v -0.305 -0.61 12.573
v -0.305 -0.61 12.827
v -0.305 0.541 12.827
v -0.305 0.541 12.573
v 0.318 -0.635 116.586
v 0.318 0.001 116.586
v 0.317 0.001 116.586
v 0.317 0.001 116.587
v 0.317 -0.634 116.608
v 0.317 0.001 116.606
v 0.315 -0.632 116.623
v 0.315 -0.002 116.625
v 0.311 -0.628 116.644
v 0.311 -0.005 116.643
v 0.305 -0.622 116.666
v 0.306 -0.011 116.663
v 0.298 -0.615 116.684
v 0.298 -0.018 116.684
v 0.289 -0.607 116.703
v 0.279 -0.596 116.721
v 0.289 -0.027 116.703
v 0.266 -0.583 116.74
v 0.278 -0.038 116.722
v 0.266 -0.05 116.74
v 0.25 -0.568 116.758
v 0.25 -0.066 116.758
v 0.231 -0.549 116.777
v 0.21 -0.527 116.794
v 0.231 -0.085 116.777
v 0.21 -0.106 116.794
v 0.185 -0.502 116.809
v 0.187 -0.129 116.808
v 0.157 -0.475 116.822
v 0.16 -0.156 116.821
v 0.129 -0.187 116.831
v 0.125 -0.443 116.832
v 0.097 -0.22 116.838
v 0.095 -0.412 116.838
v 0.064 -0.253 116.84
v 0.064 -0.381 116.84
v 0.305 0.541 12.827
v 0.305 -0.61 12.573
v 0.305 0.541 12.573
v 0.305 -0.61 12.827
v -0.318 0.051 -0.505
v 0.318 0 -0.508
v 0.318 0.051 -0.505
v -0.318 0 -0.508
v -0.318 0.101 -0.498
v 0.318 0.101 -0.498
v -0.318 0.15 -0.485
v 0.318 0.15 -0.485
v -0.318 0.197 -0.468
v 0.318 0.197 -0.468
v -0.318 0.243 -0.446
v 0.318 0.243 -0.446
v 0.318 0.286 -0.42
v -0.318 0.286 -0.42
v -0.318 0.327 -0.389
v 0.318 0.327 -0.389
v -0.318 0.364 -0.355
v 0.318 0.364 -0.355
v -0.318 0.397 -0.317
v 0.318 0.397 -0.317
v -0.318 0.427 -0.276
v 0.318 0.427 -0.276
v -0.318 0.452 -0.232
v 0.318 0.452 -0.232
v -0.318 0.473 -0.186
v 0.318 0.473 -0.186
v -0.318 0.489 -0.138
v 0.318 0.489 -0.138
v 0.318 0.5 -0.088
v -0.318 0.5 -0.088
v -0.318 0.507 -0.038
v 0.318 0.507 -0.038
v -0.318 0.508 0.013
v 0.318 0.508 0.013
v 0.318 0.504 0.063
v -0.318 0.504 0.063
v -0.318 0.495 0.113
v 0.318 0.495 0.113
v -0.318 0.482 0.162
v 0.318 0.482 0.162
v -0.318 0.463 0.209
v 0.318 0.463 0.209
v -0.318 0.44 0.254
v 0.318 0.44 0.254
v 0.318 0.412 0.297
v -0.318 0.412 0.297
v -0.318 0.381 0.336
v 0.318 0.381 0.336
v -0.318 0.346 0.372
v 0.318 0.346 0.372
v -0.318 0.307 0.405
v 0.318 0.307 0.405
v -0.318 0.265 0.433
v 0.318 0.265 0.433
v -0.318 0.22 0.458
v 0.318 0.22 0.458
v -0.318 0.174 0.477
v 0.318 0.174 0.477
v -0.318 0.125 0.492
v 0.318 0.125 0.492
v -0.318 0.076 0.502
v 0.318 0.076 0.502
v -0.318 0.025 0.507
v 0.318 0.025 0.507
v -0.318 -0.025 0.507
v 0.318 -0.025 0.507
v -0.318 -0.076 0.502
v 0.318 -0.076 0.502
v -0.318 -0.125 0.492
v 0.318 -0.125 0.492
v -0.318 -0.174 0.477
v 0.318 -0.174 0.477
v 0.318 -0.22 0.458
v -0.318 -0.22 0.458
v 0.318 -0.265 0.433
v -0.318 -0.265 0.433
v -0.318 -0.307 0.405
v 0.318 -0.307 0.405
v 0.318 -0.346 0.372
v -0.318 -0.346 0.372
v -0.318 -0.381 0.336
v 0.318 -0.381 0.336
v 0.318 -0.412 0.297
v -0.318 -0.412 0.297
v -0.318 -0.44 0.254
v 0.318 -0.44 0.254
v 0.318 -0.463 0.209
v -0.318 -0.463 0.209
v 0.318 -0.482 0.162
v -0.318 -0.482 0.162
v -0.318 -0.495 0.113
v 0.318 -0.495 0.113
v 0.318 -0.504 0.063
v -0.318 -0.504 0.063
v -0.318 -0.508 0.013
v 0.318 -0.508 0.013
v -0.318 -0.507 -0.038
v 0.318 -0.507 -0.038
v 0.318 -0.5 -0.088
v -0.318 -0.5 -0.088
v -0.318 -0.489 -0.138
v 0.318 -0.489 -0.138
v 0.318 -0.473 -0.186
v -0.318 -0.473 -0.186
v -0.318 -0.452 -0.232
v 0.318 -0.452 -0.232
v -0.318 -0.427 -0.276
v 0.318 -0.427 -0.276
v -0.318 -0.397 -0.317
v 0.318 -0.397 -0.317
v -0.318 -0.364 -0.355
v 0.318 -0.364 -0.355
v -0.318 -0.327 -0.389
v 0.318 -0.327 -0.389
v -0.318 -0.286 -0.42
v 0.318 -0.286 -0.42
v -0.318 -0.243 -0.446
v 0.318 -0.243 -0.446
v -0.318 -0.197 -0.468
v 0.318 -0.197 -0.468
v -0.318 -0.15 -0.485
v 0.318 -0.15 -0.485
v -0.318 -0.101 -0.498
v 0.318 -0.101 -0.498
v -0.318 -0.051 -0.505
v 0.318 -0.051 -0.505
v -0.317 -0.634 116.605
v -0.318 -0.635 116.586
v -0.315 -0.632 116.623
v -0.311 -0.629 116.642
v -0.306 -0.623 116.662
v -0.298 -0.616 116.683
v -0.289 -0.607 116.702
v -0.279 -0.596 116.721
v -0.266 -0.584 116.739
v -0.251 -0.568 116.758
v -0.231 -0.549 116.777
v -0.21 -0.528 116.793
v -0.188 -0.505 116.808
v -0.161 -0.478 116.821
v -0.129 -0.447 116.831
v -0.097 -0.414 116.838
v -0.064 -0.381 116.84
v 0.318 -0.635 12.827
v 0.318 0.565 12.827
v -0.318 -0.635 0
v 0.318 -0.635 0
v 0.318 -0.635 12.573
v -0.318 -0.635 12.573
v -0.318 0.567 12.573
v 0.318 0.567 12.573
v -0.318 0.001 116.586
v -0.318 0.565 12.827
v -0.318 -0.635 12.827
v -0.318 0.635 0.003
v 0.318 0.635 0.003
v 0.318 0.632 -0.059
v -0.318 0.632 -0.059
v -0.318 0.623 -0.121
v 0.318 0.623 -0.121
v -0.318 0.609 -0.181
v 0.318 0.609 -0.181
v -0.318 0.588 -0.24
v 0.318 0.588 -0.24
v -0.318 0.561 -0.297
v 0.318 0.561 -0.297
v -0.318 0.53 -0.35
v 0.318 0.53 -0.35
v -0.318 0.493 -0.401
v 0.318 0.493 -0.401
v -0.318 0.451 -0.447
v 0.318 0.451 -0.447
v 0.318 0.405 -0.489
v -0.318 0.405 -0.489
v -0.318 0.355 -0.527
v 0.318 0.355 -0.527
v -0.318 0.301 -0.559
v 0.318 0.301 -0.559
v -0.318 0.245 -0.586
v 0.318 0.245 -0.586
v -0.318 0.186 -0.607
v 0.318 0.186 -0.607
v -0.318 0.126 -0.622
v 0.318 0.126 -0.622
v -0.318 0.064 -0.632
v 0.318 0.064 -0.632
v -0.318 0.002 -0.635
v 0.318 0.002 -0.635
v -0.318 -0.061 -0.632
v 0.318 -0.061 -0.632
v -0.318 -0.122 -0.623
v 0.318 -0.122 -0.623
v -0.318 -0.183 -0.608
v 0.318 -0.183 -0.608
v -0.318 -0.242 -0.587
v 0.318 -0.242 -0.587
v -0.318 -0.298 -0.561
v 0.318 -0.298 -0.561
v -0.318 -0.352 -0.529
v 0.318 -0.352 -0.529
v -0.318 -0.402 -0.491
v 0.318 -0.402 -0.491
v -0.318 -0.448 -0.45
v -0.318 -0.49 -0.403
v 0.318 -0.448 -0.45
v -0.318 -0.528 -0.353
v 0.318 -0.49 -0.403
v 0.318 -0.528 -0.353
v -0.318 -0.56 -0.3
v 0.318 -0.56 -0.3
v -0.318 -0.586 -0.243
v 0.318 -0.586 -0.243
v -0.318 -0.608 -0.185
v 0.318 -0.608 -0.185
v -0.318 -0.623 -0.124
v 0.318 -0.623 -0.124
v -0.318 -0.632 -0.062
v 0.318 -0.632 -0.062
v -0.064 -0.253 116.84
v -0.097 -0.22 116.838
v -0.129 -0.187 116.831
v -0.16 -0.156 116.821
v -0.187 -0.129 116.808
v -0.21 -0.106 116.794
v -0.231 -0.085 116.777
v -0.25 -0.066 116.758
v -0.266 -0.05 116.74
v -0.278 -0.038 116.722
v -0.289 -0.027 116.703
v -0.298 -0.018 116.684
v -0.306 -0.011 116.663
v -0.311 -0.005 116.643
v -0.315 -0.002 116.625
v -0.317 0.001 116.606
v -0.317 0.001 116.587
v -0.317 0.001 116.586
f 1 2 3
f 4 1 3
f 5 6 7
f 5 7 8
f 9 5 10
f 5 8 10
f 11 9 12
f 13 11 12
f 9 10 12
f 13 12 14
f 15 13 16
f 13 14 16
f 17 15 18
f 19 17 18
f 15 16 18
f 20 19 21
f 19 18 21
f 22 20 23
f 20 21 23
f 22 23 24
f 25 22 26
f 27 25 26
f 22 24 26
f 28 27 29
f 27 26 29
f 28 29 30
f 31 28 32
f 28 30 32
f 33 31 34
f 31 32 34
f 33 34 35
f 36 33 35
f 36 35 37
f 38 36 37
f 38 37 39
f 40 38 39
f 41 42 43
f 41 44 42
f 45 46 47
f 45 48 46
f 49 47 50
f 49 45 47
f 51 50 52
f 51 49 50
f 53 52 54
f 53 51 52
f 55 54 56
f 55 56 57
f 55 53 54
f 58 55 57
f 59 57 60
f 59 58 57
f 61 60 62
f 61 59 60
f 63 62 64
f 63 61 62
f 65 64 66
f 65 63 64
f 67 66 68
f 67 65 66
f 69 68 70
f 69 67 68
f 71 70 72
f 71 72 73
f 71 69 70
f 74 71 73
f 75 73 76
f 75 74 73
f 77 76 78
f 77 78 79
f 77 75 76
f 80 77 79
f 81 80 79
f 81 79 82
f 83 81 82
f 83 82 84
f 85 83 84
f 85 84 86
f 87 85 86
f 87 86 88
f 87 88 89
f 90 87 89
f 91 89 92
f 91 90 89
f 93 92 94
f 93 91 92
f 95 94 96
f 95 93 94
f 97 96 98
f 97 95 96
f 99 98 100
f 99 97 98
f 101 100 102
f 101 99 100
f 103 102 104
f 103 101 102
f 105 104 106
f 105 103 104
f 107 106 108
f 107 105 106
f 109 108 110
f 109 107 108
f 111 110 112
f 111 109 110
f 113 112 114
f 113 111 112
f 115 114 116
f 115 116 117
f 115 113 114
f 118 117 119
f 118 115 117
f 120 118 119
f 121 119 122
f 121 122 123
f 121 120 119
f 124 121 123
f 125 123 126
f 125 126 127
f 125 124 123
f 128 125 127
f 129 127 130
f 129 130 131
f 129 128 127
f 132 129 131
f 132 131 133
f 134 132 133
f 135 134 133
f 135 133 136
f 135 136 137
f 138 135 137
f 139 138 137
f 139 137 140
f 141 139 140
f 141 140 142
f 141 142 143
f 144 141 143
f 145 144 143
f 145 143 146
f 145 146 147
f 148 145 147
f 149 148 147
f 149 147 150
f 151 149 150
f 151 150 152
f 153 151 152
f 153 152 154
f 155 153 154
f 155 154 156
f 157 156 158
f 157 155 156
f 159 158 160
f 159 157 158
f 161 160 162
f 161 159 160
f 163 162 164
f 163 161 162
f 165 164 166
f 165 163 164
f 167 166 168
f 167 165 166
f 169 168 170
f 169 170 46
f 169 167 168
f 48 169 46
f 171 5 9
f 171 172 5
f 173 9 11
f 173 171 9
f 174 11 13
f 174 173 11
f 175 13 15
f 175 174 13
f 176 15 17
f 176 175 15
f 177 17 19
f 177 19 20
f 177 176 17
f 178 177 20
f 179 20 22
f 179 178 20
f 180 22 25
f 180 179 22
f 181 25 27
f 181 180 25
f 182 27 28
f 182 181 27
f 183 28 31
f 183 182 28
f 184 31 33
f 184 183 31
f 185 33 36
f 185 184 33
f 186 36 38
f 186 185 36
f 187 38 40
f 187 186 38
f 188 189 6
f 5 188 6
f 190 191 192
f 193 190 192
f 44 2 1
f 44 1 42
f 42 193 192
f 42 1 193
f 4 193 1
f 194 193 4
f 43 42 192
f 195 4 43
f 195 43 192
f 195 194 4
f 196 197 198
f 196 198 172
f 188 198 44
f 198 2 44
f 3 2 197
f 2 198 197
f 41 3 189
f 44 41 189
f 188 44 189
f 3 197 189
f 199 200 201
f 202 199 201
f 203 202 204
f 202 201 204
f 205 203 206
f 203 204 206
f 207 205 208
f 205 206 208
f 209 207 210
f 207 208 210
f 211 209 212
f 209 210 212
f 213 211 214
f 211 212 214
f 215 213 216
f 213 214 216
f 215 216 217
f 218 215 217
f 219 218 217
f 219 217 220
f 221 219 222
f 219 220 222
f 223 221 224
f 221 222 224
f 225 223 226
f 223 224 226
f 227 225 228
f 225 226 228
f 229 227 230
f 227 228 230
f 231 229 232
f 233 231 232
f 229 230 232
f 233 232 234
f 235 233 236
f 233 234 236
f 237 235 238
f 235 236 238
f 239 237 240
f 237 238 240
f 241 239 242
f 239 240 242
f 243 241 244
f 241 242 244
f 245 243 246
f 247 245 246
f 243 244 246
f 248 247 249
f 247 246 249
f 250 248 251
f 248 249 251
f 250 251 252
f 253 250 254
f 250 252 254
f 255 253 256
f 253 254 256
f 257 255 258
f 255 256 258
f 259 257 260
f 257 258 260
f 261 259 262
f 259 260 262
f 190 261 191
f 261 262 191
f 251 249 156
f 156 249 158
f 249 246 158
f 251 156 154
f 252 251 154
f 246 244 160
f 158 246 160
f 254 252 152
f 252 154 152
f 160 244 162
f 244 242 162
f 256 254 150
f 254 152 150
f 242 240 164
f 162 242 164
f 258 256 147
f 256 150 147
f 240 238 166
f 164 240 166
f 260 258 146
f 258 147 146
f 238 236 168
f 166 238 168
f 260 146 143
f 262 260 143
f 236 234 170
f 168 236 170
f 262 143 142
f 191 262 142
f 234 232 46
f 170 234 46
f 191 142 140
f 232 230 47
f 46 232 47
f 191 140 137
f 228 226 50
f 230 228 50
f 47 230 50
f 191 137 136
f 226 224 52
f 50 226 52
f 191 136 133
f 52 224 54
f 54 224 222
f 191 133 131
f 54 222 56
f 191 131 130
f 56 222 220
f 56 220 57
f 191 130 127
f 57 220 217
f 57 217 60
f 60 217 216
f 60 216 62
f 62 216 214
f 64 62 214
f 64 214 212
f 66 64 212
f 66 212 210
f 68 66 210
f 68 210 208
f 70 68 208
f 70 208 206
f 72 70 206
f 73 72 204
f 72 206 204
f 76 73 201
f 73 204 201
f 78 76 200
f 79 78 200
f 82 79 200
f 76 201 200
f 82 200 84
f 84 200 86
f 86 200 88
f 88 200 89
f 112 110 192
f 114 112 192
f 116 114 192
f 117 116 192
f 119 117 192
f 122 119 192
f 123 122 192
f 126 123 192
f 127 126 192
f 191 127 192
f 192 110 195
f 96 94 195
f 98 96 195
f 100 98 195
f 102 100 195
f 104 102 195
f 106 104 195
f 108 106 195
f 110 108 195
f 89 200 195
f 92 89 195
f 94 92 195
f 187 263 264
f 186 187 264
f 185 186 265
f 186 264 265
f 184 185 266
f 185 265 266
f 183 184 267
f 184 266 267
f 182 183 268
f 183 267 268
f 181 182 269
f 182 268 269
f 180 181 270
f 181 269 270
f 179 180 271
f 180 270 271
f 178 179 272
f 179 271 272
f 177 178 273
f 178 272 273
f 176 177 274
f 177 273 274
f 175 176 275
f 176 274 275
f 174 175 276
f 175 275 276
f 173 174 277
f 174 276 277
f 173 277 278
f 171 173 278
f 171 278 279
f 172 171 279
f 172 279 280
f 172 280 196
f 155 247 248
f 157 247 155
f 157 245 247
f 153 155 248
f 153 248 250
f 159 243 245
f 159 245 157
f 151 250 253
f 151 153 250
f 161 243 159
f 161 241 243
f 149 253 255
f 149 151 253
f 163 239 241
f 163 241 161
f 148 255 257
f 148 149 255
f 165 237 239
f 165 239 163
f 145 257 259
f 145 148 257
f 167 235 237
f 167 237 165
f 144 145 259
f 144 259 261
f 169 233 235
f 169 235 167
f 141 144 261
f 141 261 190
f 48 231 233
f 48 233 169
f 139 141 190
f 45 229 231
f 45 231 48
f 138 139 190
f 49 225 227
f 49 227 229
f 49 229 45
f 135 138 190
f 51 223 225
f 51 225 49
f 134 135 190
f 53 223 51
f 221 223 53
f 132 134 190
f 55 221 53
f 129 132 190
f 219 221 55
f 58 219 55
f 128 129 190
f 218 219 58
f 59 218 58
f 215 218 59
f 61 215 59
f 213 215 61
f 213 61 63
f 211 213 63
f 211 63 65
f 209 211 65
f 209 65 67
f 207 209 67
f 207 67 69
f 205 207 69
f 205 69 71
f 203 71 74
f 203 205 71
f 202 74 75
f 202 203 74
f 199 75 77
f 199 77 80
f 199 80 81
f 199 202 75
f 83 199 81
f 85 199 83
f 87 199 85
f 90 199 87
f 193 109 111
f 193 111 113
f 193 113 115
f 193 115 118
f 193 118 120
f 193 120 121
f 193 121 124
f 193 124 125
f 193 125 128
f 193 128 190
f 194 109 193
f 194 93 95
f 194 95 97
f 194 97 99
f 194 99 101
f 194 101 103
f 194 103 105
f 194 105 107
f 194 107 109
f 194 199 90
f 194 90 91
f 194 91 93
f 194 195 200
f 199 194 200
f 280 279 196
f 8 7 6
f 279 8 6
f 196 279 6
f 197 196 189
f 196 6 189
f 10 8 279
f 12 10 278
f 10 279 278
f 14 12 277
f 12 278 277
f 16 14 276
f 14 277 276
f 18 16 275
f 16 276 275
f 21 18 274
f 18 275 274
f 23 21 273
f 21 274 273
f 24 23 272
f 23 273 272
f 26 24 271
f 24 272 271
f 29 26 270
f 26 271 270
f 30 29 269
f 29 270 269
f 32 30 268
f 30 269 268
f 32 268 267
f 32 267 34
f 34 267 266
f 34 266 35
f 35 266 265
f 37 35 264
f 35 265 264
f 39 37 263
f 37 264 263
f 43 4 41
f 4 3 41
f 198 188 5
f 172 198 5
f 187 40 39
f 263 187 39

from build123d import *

# Parameters (mm, degrees)
SKETCH2_R           = 0.508
BOSS_EXTRUDE1_DEPTH = 0.3175
FILLET1_R           = 0.254
SKETCH3_W           = 1.016
SKETCH3_H           = 1.524
SKETCH3_W_2         = 0.6096
SKETCH3_H_2         = 1.15018662
CUT_EXTRUDE1_DEPTH  = 0.127


with BuildPart() as part:
    # Sketch2 → Boss-Extrude1 (new body, symmetric)
    with BuildSketch(Plane(origin=(0, 0, 0), x_dir=(0, 0, -1), z_dir=(1, 0, 0))):
        with BuildLine():
            Line((0, -0.635), (-116.84, -0.635))
            Line((-116.84, -0.635), (-116.84, 0))
            Line((-116.84, 0), (-0.003451087, 0.634990622))
            ThreePointArc((-0.003451087, 0.634990622), (0.634997655, 0.00172555), (0, -0.635))
        make_face()
        Circle(SKETCH2_R, mode=Mode.SUBTRACT)
    extrude(amount=BOSS_EXTRUDE1_DEPTH, both=True)

    # Fillet1
    fillet1_edges = [part.edges().sort_by_distance(p)[0] for p in [
        (0.3175, -0.3175, 116.84),
        (-0.3175, -0.3175, 116.84),
        (0, -0.635, 116.84),
        (0, 0, 116.84),
    ]]
    fillet(fillet1_edges, radius=FILLET1_R)

    # Sketch3 → Cut-Extrude1 (cut, symmetric)
    with BuildSketch(Plane.XY.offset(12.7)):
        with Locations((0, -0.03450669)):
            Rectangle(SKETCH3_W, SKETCH3_H)
        with Locations((0, -0.03450669)):
            Rectangle(SKETCH3_W_2, SKETCH3_H_2, mode=Mode.SUBTRACT)
    extrude(amount=CUT_EXTRUDE1_DEPTH, both=True, mode=Mode.SUBTRACT)


solid = part.part
